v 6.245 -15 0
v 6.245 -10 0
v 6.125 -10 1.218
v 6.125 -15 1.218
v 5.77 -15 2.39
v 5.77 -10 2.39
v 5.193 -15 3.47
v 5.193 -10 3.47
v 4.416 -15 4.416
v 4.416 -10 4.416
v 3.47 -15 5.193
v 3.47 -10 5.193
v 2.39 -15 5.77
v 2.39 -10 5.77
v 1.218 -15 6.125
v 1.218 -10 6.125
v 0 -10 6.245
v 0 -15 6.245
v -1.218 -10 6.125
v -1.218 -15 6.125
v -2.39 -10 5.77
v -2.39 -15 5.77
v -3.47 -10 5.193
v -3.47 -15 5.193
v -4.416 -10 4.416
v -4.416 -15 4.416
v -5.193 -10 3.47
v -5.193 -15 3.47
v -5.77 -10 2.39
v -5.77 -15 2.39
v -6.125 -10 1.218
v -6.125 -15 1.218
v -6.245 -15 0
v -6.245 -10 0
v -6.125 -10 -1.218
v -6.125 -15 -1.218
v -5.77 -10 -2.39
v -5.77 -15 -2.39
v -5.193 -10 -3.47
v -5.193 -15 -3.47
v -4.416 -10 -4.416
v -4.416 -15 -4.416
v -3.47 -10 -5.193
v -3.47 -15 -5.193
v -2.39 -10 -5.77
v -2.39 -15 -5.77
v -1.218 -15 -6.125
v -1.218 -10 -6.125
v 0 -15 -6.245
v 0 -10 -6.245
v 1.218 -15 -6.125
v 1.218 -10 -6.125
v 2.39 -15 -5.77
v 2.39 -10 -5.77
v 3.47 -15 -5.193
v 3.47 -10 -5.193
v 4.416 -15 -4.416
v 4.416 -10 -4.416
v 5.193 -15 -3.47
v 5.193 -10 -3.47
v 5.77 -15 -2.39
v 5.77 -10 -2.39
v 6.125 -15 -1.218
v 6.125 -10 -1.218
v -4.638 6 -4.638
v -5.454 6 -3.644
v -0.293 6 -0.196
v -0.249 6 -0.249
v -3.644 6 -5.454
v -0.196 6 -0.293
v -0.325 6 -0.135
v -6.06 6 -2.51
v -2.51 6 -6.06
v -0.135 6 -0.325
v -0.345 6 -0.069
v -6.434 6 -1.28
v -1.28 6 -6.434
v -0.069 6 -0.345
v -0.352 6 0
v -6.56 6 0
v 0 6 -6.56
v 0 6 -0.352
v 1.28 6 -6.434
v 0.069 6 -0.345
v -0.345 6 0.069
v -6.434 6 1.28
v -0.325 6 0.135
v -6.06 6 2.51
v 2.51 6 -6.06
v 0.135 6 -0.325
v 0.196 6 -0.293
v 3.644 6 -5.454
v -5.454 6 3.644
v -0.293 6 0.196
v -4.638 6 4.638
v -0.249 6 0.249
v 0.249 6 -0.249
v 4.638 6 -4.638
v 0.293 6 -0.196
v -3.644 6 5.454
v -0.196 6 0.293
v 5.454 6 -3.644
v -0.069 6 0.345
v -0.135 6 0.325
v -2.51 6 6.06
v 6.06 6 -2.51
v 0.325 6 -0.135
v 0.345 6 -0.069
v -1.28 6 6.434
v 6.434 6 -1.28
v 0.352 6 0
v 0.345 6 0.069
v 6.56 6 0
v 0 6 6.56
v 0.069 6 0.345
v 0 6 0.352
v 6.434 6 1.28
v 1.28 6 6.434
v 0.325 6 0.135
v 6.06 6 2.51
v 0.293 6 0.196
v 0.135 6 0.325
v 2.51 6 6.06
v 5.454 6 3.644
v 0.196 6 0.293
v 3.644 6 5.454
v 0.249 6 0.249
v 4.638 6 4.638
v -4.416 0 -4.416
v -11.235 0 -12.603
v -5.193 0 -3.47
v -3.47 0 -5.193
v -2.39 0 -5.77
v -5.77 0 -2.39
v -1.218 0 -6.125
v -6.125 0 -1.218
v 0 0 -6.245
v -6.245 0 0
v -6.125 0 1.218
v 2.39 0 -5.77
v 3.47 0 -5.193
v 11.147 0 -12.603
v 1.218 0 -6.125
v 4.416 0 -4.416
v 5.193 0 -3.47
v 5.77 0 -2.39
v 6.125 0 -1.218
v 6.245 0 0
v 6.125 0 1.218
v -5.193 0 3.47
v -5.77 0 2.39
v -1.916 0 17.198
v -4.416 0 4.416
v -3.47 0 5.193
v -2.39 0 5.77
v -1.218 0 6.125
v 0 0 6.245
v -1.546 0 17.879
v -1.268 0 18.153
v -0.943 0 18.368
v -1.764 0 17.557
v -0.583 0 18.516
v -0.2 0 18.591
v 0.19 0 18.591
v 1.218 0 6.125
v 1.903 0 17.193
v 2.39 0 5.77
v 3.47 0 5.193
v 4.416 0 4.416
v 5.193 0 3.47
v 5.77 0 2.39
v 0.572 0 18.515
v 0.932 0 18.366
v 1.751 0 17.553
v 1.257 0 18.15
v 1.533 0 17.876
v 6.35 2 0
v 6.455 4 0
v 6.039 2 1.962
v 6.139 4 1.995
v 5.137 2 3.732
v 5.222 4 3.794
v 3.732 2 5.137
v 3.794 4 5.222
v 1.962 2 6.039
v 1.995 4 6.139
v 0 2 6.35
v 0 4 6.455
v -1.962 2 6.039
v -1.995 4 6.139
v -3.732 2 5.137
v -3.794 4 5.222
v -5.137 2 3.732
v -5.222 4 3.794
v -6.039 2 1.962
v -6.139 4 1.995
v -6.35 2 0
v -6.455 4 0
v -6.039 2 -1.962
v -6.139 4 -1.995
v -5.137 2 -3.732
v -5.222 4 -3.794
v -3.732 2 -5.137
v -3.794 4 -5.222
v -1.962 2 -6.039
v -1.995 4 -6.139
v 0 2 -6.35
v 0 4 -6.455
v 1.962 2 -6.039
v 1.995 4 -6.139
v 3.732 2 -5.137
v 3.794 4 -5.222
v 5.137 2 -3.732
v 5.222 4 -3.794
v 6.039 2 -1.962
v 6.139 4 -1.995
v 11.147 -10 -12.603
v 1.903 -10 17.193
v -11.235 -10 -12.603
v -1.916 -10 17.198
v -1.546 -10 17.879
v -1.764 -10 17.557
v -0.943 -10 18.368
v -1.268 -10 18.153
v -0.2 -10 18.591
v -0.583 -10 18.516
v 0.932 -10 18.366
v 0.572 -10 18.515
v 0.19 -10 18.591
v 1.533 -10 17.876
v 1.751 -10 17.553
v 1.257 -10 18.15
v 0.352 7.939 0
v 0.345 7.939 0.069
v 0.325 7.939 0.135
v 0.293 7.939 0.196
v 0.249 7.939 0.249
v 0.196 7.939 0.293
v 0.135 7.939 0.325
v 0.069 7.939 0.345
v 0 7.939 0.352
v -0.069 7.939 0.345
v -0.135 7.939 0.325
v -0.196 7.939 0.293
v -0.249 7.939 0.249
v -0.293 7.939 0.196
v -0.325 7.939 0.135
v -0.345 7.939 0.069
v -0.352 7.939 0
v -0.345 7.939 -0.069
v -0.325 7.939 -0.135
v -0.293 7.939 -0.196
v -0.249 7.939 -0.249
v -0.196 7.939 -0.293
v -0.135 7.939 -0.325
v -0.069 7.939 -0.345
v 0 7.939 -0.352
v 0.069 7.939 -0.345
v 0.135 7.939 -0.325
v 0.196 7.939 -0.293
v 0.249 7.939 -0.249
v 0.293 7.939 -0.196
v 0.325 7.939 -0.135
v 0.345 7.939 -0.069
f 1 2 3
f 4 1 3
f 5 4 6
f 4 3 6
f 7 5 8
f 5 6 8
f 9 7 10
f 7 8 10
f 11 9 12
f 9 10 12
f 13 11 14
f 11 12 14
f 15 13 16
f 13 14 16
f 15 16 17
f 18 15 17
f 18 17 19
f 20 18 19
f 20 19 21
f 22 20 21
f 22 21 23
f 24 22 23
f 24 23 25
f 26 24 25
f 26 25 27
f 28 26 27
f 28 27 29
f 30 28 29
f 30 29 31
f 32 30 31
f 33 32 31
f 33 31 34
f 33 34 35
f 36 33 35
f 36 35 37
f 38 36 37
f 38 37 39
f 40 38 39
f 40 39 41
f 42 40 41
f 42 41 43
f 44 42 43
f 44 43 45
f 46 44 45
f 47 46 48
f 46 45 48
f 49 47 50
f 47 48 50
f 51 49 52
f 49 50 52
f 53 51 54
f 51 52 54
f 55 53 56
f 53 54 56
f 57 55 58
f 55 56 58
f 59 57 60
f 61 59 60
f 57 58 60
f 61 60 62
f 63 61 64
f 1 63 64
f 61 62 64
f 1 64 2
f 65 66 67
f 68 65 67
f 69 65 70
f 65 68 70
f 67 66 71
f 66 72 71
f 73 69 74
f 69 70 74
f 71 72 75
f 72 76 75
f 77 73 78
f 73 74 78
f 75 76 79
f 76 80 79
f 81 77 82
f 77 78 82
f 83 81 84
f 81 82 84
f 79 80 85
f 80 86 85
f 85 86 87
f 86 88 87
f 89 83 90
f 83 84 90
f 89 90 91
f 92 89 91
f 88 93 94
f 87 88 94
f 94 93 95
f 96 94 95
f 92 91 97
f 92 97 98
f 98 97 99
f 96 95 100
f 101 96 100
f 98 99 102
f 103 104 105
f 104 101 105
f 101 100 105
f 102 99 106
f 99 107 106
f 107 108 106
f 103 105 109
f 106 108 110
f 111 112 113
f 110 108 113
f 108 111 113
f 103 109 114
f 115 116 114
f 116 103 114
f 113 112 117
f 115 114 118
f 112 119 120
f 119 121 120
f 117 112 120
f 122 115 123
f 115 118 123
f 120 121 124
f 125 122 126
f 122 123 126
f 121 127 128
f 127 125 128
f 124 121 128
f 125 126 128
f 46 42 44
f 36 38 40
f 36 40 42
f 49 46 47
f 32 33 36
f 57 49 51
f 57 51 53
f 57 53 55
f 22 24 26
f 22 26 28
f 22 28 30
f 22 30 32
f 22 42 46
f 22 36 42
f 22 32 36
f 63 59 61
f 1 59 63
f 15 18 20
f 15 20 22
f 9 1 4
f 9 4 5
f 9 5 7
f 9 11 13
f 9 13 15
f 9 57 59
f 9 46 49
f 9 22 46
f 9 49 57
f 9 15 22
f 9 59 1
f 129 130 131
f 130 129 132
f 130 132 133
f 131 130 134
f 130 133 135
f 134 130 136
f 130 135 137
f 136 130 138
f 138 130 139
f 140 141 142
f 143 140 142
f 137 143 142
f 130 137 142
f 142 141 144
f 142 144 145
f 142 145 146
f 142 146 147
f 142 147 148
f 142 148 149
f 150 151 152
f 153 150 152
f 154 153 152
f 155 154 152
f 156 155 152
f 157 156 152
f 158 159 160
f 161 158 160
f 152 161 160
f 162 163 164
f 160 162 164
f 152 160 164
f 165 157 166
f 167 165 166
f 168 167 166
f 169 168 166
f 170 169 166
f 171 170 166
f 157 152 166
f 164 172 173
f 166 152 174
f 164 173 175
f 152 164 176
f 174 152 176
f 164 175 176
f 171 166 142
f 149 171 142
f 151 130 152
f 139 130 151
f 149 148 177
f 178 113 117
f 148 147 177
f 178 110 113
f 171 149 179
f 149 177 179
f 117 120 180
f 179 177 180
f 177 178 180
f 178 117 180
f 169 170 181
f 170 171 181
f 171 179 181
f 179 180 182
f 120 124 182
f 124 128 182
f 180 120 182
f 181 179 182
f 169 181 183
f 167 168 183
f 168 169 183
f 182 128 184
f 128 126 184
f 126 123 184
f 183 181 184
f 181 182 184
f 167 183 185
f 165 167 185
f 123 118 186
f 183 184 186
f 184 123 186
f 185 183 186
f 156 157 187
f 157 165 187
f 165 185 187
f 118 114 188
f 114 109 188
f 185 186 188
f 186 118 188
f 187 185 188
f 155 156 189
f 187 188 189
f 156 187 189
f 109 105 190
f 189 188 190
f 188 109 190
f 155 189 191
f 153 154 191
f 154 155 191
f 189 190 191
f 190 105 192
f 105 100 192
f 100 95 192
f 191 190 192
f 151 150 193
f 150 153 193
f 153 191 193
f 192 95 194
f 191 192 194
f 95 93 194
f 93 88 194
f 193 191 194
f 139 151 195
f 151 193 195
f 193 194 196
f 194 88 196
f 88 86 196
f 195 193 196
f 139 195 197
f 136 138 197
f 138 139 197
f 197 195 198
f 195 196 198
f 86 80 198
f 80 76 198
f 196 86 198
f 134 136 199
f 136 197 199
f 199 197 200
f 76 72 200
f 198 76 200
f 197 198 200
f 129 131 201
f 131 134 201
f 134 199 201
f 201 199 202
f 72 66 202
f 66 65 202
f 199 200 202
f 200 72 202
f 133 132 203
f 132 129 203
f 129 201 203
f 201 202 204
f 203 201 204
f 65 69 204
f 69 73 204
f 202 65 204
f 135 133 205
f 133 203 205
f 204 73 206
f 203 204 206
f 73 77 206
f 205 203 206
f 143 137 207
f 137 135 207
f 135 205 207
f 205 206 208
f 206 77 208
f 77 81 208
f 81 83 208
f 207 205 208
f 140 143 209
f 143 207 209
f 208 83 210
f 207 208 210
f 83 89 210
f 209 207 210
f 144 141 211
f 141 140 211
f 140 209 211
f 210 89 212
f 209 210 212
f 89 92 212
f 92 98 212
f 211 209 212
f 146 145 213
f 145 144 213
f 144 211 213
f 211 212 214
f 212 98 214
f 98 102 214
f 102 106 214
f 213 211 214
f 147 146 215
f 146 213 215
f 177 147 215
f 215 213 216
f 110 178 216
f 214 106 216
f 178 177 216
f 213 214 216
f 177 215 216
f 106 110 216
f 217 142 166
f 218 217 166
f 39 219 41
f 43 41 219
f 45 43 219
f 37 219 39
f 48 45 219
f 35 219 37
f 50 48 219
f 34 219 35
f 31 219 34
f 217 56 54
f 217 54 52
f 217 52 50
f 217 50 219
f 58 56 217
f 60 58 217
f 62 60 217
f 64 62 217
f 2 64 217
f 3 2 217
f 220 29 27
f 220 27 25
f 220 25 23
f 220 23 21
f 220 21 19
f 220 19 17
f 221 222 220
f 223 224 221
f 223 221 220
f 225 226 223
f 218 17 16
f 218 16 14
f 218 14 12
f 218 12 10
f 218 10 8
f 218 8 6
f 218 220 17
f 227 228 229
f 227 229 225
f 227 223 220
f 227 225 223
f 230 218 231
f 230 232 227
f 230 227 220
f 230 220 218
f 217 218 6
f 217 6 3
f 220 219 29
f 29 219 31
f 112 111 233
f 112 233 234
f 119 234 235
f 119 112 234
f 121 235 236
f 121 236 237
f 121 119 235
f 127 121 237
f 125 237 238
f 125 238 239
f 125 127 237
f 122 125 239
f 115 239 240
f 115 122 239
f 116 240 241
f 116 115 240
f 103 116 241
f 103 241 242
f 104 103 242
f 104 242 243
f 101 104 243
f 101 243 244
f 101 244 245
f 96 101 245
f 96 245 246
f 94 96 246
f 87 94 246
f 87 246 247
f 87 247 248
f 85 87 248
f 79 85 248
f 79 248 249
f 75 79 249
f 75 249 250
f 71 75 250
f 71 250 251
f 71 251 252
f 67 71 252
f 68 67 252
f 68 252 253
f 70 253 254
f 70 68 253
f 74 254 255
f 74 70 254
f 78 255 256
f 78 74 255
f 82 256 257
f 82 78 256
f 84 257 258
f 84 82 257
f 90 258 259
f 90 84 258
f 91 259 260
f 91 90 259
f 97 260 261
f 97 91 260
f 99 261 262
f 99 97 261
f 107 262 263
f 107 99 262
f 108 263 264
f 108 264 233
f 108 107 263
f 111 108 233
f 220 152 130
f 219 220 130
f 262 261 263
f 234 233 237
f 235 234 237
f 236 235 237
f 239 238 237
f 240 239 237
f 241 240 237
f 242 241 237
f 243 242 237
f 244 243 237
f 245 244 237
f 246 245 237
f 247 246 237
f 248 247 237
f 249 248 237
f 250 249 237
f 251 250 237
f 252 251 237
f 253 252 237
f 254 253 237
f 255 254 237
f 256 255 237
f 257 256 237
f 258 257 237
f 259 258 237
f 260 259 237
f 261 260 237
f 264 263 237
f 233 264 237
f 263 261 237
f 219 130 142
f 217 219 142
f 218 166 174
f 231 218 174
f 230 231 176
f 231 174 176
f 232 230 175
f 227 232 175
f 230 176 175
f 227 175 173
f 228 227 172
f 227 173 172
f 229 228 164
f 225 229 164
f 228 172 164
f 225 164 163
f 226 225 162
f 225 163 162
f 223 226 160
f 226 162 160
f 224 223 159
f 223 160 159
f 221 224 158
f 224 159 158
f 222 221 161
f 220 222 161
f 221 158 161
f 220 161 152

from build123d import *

# Parameters (mm, degrees)
F0_R     = 6.2452743357
F3_DEPTH = 10
F1_DEPTH = 15
F2_DEPTH = 6
F2_TAPER = -3
F4_R     = 0.351908714
F5_DEPTH = 7.938971743


with BuildPart() as f3:
    # F0 (on Front) → F3 (new body)
    with BuildSketch(Plane.XZ):
        with BuildLine():
            Line((11.1467493973, -12.6034934074), (1.9026910835, 17.1933302465))
            ThreePointArc((1.9026910835, 17.1933302465), (-0.0052668021, 18.6007195565), (-1.9163570551, 17.1975866305))
            Line((-1.9163570551, 17.1975866305), (-11.2346072181, -12.6034934074))
            Line((-11.2346072181, -12.6034934074), (11.1467493973, -12.6034934074))
        make_face()
        Circle(F0_R, mode=Mode.SUBTRACT)
        Circle(F0_R)
    extrude(amount=F3_DEPTH)

    # F0 (on Front) → F1 (join)
    with BuildSketch(Plane.XZ):
        Circle(F0_R)
    extrude(amount=F1_DEPTH)

    # F0 (on Front) → F2 (join)
    with BuildSketch(Plane.XZ):
        Circle(F0_R)
    extrude(amount=-F2_DEPTH, taper=F2_TAPER)

    # F4 (on face) → F5 (join)
    with BuildSketch(Plane.XZ):
        Circle(F4_R)
    extrude(amount=-F5_DEPTH)


solid = f3.part
